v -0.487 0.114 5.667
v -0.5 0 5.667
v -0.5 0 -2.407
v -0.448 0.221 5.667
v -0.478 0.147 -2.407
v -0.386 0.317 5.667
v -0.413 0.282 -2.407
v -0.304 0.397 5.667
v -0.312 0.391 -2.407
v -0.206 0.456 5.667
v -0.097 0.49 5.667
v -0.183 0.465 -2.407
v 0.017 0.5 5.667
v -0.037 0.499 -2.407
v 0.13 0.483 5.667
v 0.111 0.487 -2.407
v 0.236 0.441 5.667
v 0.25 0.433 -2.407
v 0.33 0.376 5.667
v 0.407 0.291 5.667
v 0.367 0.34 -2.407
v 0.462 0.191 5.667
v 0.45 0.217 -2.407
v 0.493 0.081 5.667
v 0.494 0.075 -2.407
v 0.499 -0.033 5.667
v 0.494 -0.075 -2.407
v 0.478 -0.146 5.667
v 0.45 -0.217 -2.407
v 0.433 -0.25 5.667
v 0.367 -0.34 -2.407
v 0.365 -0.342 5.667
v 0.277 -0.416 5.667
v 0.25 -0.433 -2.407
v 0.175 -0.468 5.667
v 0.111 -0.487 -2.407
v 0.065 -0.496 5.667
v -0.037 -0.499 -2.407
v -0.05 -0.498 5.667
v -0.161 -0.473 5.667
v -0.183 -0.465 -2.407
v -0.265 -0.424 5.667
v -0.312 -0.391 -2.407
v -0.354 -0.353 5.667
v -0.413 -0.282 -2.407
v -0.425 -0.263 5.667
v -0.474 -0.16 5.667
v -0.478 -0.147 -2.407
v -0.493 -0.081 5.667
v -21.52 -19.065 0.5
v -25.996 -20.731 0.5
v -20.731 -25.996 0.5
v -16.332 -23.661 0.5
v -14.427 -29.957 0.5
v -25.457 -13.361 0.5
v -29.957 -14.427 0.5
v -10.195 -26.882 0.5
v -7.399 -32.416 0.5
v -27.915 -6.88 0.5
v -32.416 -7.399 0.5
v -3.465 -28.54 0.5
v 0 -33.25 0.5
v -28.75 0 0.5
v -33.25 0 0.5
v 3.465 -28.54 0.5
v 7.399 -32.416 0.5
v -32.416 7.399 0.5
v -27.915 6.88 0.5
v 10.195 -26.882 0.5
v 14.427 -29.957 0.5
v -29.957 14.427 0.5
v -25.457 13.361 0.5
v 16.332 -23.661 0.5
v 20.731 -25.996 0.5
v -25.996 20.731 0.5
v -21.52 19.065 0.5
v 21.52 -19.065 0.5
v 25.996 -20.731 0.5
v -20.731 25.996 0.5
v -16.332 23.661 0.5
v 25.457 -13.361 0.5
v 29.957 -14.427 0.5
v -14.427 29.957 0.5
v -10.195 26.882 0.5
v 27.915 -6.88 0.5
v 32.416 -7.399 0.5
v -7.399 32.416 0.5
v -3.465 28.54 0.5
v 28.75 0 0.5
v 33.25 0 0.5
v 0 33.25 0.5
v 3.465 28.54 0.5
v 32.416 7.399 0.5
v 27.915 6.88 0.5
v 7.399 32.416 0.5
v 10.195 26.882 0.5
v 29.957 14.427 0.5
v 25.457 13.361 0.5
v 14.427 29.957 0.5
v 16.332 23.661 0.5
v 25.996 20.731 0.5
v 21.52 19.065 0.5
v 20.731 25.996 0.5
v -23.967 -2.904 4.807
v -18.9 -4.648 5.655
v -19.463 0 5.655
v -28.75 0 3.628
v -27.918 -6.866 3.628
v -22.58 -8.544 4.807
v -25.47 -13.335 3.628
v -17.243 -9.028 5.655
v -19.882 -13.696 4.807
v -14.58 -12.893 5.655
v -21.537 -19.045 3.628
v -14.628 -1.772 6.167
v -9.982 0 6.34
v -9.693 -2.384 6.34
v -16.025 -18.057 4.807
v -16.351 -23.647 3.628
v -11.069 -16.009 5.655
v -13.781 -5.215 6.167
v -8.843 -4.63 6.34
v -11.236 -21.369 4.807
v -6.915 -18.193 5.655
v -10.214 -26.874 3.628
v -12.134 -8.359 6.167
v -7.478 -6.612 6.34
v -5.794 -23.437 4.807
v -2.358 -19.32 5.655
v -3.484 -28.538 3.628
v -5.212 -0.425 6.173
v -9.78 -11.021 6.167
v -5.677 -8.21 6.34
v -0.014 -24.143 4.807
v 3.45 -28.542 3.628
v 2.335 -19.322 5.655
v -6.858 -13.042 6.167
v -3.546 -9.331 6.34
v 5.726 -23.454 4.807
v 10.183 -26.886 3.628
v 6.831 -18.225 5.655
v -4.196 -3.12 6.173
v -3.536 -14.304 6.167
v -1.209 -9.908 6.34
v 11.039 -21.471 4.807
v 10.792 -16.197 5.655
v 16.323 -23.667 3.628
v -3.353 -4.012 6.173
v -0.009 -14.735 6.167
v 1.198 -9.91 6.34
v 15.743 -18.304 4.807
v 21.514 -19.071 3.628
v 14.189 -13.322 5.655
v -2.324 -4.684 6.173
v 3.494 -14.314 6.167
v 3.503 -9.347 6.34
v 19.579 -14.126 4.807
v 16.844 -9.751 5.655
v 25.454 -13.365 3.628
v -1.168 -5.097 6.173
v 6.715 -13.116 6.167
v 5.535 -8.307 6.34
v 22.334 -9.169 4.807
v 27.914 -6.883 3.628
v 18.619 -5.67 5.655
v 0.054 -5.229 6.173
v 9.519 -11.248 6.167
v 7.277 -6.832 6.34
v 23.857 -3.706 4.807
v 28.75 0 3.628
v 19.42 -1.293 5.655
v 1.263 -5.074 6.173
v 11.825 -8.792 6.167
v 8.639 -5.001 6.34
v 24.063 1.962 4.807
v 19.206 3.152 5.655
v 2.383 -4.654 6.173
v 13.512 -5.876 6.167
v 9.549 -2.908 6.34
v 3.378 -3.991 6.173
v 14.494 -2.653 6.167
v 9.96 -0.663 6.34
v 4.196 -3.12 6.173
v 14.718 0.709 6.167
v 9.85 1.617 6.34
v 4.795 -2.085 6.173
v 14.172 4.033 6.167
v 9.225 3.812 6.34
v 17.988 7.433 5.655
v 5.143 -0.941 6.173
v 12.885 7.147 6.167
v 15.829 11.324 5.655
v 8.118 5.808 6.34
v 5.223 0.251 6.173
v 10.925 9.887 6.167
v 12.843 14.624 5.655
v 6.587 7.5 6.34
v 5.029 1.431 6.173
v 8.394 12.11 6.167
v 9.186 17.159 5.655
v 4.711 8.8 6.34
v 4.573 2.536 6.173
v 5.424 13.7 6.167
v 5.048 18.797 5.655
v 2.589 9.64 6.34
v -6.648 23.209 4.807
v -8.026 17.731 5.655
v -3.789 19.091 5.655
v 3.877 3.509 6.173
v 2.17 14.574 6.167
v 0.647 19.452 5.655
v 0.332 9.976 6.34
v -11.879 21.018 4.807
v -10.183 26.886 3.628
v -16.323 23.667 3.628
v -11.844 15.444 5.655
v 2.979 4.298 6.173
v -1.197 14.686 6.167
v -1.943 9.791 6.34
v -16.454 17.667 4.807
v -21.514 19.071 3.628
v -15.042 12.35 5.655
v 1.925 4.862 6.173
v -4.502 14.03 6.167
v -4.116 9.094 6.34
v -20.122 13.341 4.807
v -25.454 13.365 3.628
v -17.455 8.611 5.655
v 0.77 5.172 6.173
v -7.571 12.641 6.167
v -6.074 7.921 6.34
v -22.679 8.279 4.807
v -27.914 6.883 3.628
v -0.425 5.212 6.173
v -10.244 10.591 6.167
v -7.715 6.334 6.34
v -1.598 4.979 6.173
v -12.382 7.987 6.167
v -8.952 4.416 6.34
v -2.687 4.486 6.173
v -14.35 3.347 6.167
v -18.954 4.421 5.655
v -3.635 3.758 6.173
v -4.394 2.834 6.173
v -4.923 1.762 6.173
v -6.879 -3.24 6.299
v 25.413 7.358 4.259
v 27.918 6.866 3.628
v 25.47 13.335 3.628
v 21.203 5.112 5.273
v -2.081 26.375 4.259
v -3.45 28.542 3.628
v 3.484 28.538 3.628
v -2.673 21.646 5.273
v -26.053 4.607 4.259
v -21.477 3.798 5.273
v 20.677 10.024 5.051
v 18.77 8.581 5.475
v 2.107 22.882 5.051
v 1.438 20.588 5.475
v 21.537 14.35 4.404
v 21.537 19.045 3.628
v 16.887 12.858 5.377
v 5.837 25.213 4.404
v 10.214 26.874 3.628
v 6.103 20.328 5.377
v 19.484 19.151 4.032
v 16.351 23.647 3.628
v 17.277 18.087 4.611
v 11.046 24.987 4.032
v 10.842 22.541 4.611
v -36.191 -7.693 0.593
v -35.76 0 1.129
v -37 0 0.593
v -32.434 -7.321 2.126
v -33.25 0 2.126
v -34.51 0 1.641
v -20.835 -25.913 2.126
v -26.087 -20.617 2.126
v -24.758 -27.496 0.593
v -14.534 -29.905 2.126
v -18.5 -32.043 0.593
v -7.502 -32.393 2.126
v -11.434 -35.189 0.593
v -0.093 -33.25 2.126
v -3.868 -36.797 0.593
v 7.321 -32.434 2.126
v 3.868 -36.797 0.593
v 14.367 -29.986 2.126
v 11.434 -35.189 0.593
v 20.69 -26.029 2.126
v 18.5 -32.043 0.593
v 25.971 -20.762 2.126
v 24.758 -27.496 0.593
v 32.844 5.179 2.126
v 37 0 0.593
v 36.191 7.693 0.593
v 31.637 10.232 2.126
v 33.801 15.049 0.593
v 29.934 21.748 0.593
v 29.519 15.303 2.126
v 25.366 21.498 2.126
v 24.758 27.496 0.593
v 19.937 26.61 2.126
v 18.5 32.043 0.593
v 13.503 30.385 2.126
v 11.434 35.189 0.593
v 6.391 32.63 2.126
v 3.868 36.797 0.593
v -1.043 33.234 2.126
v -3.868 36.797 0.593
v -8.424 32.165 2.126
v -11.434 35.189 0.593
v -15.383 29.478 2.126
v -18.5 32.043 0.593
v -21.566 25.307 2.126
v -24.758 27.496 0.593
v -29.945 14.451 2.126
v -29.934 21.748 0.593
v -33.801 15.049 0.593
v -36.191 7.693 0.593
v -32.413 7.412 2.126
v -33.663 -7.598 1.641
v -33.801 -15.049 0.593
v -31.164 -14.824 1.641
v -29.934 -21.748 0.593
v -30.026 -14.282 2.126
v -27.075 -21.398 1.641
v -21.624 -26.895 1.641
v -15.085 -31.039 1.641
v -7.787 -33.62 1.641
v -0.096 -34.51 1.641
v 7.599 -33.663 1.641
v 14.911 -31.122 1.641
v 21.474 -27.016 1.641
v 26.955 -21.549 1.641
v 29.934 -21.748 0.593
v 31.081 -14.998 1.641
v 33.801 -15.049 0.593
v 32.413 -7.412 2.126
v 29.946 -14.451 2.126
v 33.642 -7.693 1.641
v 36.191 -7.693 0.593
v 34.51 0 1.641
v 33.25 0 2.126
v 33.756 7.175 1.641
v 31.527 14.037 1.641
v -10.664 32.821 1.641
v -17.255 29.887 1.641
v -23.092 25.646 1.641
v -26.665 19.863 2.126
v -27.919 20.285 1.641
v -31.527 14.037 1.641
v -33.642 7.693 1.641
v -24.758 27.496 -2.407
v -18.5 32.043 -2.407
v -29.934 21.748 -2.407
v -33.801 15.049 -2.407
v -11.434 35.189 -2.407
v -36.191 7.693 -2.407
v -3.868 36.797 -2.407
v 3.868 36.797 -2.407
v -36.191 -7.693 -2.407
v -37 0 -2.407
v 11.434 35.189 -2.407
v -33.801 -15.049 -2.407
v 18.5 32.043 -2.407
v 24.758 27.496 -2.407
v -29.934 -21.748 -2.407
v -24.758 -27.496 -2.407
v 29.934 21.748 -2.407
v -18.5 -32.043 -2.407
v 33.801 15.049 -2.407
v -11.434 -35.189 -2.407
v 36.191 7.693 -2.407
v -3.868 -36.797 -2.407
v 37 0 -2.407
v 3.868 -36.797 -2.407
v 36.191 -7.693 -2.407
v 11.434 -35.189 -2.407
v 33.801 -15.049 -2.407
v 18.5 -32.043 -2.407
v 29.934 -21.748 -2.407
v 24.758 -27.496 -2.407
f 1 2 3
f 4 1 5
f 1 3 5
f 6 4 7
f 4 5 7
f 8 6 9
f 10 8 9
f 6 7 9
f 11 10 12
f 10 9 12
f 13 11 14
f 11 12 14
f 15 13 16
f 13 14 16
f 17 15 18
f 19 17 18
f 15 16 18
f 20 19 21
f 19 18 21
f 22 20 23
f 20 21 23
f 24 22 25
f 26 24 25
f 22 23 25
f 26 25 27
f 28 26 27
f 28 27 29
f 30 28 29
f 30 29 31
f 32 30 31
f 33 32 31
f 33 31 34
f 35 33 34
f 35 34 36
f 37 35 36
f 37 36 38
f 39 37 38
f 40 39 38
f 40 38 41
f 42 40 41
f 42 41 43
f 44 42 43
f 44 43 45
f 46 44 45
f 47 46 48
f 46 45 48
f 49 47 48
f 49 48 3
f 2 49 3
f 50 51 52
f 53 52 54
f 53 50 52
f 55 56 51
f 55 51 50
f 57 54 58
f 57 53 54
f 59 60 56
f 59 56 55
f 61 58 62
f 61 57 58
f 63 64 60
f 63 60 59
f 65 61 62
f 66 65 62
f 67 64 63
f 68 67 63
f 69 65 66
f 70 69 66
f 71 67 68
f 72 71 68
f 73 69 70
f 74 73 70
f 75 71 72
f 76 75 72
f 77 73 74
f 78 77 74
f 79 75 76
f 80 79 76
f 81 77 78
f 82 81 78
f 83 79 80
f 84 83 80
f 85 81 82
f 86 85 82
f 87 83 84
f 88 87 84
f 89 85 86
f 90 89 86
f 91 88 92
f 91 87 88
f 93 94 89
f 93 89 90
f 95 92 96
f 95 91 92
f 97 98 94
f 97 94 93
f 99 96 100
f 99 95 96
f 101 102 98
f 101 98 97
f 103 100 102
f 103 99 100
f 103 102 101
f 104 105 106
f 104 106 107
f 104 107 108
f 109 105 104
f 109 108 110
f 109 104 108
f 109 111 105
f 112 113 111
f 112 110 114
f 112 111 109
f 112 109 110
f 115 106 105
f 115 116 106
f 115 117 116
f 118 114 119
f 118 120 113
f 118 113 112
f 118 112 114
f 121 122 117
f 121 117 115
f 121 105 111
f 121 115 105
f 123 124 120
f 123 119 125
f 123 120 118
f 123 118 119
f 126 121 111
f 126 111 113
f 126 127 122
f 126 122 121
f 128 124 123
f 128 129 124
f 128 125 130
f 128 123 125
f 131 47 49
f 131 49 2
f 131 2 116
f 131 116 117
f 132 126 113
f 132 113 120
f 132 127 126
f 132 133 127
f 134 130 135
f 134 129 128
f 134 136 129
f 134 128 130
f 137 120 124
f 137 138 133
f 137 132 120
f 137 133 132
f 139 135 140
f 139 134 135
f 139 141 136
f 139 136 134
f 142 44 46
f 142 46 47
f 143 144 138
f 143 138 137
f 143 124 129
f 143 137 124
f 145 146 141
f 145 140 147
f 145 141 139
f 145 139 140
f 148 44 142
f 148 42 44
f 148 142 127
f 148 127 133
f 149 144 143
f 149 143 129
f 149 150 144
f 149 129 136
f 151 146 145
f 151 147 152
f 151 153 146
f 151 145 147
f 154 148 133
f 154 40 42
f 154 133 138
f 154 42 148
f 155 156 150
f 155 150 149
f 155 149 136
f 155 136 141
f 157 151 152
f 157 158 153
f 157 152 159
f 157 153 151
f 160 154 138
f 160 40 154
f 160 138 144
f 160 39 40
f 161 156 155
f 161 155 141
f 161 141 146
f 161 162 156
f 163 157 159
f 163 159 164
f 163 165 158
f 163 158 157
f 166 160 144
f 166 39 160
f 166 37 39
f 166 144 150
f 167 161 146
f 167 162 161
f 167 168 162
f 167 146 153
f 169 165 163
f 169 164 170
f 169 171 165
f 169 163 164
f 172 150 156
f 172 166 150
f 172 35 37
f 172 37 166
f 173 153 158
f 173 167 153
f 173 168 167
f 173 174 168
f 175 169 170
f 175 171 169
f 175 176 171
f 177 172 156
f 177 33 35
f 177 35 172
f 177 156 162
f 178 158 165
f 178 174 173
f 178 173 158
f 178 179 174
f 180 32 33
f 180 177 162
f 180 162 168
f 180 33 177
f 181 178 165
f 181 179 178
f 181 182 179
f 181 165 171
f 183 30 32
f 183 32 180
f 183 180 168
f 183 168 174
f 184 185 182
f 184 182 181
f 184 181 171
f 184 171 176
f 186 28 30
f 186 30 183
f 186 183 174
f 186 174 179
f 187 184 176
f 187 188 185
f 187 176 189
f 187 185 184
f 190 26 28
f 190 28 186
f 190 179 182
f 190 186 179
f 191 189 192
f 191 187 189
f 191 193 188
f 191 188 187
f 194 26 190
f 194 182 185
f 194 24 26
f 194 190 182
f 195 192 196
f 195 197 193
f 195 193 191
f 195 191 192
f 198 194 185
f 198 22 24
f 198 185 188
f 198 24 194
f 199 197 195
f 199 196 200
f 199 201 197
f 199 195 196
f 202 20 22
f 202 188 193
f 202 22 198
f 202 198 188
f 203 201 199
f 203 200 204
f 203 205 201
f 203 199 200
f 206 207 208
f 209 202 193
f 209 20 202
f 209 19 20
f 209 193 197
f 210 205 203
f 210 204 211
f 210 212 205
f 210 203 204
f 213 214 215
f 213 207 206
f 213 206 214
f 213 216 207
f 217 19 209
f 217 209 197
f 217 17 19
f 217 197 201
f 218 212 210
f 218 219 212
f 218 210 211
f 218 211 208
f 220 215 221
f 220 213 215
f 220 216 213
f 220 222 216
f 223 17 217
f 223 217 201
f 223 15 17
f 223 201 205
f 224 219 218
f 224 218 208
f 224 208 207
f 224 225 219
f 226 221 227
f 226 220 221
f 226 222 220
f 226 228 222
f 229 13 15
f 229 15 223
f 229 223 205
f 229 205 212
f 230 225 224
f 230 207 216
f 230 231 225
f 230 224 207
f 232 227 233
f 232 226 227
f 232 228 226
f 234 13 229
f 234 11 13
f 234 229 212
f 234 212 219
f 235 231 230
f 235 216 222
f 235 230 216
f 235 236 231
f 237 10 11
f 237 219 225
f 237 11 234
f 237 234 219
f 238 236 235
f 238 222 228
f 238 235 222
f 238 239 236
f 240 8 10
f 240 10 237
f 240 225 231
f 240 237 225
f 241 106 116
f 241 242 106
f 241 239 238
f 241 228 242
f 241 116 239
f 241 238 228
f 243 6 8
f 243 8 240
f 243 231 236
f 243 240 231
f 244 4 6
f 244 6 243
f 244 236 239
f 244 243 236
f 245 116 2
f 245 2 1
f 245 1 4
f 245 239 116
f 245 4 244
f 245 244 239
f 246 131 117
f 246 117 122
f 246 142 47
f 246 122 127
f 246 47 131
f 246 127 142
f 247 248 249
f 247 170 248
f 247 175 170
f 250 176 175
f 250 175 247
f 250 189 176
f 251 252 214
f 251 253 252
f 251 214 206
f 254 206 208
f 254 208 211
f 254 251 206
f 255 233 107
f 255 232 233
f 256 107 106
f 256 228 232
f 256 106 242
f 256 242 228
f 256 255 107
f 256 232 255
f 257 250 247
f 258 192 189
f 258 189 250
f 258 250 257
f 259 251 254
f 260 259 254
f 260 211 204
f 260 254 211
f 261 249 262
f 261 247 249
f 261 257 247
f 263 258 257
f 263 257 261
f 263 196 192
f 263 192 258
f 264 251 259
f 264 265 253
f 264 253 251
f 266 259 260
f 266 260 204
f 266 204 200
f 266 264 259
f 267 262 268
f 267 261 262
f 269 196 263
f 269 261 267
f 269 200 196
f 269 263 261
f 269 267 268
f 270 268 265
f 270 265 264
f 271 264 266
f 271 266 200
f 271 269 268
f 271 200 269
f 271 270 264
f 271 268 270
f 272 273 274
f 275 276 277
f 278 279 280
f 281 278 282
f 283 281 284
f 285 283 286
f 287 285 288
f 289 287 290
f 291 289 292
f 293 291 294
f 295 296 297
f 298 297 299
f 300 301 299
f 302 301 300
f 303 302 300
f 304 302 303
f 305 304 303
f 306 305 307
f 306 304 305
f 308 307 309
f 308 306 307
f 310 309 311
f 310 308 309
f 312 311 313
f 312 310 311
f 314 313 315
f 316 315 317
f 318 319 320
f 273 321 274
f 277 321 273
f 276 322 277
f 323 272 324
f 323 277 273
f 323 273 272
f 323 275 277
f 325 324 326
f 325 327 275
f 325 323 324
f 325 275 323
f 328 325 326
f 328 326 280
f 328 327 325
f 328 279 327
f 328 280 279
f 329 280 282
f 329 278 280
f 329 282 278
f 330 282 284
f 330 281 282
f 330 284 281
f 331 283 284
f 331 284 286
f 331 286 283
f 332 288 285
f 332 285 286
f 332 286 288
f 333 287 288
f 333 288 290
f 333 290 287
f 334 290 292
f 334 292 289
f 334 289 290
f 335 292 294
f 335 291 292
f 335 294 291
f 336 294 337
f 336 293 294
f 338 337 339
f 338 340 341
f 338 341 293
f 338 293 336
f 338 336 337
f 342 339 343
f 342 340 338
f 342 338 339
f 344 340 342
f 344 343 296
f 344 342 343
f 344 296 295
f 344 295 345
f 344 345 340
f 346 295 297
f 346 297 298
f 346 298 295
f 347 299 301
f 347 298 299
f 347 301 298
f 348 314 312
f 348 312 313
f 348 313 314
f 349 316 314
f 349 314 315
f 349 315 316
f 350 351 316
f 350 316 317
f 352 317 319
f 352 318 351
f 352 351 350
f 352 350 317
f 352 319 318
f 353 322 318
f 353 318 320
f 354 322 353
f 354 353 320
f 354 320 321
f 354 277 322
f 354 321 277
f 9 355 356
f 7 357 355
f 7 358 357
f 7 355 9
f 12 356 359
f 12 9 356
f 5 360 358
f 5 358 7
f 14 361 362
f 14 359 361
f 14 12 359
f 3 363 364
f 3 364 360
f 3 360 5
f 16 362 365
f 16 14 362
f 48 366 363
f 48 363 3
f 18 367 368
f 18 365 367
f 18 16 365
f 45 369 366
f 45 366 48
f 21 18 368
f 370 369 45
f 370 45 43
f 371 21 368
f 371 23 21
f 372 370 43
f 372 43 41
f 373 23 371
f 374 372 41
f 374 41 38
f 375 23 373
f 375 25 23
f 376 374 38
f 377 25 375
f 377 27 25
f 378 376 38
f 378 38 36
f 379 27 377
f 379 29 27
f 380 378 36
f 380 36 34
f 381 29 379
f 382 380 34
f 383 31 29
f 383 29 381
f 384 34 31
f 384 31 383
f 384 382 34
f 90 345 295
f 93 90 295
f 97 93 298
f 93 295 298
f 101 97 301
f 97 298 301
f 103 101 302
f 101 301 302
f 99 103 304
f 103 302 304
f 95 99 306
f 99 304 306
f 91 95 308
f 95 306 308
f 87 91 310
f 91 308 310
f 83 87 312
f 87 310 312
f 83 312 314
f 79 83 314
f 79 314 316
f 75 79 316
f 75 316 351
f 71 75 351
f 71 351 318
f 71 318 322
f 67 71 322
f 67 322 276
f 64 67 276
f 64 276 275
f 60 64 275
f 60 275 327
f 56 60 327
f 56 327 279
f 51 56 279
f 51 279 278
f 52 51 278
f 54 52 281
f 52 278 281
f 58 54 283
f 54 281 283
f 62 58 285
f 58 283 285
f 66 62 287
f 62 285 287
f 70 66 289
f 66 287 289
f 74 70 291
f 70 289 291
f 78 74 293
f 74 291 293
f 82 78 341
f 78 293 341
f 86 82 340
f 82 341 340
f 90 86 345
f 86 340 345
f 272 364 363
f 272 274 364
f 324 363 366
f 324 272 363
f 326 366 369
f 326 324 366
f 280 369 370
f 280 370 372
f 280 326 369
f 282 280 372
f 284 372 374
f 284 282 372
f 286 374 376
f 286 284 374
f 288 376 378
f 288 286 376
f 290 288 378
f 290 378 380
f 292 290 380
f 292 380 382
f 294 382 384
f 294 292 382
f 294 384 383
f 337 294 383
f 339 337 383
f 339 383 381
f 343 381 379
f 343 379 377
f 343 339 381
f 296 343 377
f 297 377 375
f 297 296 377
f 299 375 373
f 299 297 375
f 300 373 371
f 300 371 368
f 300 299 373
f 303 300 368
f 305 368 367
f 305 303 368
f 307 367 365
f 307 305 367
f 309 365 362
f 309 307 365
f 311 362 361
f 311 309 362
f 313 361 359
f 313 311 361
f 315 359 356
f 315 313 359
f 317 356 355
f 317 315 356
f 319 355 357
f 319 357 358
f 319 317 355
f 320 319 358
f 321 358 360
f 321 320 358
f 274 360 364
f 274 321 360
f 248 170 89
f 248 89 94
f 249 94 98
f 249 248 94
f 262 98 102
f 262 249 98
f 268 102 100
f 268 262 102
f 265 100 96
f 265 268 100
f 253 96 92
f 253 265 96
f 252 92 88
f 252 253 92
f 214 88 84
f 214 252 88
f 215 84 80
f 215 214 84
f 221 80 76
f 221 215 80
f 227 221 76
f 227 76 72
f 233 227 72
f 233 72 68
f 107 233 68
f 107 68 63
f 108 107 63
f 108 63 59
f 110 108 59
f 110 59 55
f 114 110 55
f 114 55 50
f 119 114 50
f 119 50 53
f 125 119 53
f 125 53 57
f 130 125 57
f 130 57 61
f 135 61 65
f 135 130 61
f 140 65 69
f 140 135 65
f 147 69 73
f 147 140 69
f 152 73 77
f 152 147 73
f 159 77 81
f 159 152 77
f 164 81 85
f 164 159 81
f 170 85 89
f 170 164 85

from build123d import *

# Parameters (mm, degrees)
SKETCH2_R          = 0.5
CUT_EXTRUDE1_DEPTH = 9.746515042
SKETCH3_R          = 33.25
SKETCH3_R_2        = 28.75
CUT_EXTRUDE3_DEPTH = 7.5


with BuildPart() as part:
    # Sketch1 → Revolve1 (revolve)
    with BuildSketch(Plane(origin=(0, 0, 0), x_dir=(1, 0, 0), z_dir=(0, 1, 0))):
        with BuildLine():
            Line((0, 2.406901823), (-37, 2.406901823))
            Line((-37, 2.406901823), (-37, -0.593098177))
            ThreePointArc((-37, -0.593098177), (-18.857679345, -5.739925328), (0, -5.593098177))
            Line((0, -5.593098177), (0, 2.406901823))
        make_face()
    revolve(axis=Axis((0, 0, -18.524642857), (0, 0, 1)))

    # Sketch2 → Cut-Extrude1 (cut, through all)
    with BuildSketch(Plane(origin=(0, 0, -2.406901823), x_dir=(-1, 0, 0), z_dir=(0, 0, -1))):
        Circle(SKETCH2_R)
    extrude(amount=-CUT_EXTRUDE1_DEPTH, mode=Mode.SUBTRACT)

    # Sketch3 → Cut-Extrude3 (cut)
    with BuildSketch(Plane.XY.offset(8)):
        Circle(SKETCH3_R)
        Circle(SKETCH3_R_2, mode=Mode.SUBTRACT)
    extrude(amount=-CUT_EXTRUDE3_DEPTH, mode=Mode.SUBTRACT)


solid = part.part
